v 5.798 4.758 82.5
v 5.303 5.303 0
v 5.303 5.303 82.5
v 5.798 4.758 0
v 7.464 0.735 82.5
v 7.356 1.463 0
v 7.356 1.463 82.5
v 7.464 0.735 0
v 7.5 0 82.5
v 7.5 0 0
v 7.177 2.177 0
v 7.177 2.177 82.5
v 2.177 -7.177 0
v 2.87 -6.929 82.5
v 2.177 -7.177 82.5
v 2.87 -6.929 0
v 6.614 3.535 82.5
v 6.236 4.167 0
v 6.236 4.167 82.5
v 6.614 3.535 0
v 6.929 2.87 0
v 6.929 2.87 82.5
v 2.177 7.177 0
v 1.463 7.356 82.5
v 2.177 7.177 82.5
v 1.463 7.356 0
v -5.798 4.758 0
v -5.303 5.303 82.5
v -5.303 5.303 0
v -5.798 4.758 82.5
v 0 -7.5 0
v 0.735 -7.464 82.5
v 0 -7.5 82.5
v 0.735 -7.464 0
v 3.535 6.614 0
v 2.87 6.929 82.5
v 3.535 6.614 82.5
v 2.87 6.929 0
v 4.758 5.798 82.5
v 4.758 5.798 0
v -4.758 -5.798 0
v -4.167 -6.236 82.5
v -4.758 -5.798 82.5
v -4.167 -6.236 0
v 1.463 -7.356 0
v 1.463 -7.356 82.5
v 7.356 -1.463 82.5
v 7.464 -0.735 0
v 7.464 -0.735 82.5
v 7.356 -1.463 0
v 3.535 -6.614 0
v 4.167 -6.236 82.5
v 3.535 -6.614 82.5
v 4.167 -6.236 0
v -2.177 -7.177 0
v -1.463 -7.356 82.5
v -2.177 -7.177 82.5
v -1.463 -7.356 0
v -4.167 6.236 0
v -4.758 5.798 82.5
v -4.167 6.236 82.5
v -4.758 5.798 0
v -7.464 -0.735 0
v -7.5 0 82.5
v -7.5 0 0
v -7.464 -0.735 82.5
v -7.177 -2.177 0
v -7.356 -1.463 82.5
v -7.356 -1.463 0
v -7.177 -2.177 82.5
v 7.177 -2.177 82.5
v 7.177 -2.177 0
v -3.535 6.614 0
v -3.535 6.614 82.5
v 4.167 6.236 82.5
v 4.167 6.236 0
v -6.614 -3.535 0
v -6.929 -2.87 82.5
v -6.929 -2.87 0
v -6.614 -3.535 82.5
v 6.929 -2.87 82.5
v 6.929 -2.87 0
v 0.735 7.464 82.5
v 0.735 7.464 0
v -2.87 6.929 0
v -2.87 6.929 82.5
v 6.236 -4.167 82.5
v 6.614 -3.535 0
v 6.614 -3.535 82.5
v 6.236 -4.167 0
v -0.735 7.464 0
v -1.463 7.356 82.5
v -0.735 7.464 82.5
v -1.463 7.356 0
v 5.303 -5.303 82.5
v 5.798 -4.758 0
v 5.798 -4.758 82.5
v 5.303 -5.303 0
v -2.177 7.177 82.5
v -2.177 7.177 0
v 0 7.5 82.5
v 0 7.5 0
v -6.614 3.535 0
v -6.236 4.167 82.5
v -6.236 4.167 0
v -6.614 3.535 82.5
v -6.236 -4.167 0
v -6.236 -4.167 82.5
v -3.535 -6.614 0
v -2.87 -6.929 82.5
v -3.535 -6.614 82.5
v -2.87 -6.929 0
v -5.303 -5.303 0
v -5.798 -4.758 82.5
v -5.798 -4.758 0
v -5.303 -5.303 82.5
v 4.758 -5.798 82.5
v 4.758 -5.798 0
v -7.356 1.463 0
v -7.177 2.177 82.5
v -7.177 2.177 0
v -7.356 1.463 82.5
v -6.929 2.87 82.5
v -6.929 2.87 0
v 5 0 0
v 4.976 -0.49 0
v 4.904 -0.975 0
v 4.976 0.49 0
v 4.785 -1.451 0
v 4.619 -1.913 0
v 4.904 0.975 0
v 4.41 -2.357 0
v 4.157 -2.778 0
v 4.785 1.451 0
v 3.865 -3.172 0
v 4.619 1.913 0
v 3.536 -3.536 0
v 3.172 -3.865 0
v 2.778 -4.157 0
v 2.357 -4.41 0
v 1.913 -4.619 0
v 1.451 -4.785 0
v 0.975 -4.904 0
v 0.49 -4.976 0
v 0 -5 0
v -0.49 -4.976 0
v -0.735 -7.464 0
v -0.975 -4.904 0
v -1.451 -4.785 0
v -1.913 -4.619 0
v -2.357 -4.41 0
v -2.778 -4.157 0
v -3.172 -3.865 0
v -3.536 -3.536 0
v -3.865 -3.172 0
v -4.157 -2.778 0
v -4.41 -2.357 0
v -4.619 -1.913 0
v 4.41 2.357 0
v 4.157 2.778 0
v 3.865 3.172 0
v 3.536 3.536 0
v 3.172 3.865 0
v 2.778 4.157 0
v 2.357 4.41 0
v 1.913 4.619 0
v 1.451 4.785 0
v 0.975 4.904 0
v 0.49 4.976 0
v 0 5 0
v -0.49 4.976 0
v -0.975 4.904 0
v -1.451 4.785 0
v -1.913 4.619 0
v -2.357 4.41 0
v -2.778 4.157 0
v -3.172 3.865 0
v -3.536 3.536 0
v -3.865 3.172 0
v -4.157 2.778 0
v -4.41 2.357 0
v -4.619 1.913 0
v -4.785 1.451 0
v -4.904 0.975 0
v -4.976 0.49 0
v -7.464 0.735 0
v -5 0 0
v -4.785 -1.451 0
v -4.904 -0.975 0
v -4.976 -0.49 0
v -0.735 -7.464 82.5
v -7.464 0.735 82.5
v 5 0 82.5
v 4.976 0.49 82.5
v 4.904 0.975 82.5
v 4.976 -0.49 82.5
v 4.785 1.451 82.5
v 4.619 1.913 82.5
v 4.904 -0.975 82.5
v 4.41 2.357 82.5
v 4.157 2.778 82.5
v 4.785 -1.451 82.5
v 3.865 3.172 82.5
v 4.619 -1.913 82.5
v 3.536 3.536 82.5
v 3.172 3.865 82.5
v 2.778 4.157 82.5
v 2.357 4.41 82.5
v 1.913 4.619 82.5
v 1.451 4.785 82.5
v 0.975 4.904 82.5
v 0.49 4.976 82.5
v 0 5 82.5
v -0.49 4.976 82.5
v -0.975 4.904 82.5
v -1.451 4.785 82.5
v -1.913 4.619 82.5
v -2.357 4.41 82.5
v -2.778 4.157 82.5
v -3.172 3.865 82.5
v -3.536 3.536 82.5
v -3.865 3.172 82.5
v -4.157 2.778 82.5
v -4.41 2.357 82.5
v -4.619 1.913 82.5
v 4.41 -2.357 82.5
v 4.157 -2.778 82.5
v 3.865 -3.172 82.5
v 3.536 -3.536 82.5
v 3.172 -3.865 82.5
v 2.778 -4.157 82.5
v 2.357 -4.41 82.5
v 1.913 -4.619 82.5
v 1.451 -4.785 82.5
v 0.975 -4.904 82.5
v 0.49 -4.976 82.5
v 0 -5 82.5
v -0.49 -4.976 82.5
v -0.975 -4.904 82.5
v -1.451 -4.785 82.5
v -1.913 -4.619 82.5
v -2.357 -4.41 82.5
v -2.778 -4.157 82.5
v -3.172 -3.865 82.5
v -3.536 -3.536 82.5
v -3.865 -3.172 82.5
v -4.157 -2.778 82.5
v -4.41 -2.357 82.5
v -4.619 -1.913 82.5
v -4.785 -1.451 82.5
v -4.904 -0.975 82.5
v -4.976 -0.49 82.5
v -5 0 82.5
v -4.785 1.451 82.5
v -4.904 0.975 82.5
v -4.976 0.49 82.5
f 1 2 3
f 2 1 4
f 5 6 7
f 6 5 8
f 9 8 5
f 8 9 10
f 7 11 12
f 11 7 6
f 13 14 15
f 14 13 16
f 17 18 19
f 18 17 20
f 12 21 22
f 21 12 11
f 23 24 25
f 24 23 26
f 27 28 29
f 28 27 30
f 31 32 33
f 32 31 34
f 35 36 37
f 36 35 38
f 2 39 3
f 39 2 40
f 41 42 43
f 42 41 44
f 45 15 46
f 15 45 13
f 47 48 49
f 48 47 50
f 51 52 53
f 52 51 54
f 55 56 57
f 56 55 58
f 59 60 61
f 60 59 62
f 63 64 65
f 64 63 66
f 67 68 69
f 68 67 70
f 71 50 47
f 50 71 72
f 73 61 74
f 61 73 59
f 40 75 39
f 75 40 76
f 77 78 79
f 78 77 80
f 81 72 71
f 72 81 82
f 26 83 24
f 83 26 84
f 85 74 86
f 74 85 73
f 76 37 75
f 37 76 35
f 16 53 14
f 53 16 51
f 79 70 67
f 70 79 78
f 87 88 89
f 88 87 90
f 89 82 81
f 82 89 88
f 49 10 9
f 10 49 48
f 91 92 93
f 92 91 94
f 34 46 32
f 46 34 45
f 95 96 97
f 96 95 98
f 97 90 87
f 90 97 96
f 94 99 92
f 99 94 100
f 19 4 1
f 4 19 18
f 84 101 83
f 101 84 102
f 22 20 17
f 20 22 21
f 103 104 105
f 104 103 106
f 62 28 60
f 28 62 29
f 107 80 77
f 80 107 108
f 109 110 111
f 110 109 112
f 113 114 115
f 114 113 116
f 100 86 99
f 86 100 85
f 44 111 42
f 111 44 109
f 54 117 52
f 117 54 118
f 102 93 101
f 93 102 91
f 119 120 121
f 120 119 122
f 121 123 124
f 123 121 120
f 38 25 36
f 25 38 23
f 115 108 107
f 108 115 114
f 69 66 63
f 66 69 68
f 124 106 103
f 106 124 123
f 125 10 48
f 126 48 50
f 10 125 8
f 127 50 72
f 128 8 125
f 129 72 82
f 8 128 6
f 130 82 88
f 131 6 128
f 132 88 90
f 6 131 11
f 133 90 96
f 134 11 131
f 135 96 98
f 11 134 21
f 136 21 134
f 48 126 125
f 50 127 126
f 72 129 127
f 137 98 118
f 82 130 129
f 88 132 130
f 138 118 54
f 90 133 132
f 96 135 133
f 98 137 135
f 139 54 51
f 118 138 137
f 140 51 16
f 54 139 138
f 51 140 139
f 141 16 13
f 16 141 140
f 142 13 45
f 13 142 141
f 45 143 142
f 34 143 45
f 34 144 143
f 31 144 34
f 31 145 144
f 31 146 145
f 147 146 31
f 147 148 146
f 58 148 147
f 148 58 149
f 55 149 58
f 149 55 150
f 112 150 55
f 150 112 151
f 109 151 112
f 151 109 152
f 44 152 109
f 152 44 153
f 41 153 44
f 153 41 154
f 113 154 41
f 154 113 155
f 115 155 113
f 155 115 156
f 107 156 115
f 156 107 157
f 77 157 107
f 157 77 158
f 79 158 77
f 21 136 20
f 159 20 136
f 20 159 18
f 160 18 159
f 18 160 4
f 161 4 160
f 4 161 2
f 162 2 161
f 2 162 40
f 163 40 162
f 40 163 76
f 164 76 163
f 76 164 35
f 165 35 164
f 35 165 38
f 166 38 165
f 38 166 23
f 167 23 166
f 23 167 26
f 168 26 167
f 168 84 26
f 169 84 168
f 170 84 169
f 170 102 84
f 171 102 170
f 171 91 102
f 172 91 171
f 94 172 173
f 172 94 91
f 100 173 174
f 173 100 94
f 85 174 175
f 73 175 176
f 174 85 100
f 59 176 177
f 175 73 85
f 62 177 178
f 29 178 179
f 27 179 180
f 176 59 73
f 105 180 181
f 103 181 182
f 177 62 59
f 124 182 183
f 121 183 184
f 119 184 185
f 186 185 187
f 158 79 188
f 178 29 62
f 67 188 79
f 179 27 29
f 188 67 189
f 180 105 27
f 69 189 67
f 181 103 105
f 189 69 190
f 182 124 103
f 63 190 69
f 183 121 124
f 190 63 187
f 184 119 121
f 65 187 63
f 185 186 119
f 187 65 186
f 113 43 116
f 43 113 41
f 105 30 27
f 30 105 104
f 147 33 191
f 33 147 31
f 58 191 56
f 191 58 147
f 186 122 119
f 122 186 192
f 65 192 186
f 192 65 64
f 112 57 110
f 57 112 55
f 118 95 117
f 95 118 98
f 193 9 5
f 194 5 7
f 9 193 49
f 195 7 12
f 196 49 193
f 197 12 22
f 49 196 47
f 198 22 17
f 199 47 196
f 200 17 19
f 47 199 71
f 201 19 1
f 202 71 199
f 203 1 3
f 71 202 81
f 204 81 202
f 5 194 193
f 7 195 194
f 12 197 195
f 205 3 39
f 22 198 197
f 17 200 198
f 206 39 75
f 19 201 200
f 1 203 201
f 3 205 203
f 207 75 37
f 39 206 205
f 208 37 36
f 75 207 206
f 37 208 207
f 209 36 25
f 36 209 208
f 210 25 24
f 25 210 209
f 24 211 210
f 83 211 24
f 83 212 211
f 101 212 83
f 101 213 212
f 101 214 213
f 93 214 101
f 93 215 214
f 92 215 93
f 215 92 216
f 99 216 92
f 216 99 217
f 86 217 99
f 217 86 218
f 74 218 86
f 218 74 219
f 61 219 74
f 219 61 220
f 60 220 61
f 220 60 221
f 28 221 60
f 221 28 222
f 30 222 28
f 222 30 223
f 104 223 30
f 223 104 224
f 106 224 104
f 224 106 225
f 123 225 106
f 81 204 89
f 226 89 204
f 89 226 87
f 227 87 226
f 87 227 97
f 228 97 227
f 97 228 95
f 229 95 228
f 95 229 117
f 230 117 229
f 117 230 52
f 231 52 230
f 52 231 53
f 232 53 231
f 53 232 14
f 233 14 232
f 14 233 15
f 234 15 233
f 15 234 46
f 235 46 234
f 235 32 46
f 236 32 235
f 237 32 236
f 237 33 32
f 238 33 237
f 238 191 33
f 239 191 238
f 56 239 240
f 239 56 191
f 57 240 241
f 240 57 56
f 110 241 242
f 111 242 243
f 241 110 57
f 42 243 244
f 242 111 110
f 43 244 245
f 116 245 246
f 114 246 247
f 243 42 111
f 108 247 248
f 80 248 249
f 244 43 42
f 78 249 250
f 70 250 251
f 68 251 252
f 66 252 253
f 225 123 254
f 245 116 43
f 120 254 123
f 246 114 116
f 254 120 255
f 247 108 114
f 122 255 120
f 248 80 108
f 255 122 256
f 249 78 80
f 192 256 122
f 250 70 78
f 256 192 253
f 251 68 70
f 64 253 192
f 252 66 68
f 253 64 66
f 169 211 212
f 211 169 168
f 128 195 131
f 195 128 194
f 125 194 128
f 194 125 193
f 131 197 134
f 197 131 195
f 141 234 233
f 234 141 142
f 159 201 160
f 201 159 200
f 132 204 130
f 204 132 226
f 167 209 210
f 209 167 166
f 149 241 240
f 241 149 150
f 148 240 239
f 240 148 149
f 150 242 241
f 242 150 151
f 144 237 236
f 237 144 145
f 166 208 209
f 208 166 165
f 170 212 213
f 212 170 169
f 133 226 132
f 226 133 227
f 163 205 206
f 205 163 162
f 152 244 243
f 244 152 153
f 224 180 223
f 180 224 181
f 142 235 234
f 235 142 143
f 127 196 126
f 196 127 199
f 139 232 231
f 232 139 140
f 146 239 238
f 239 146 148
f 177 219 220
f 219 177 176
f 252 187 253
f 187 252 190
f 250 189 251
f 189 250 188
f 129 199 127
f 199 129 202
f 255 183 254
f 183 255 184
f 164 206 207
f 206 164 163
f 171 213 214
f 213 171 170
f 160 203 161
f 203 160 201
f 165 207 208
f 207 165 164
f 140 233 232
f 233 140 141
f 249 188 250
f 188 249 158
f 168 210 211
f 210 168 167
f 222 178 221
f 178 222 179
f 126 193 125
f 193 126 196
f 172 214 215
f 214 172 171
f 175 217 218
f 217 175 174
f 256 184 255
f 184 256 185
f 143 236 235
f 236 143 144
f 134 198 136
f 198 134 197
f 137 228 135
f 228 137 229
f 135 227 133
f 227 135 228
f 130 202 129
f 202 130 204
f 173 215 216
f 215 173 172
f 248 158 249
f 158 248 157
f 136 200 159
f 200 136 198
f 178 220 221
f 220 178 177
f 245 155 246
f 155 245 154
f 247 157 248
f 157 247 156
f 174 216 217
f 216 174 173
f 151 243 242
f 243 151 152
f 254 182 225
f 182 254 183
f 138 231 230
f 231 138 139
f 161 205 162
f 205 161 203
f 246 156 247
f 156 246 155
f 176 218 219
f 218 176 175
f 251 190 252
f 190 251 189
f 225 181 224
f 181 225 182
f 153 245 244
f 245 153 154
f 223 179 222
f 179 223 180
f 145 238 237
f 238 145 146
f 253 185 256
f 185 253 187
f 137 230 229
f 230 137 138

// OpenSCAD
difference() {
    cylinder(h=82.5, d=15.0, $fn=64);
    translate([0, 0, -1])
        cylinder(h=84.5, d=10.0, $fn=64);
}
